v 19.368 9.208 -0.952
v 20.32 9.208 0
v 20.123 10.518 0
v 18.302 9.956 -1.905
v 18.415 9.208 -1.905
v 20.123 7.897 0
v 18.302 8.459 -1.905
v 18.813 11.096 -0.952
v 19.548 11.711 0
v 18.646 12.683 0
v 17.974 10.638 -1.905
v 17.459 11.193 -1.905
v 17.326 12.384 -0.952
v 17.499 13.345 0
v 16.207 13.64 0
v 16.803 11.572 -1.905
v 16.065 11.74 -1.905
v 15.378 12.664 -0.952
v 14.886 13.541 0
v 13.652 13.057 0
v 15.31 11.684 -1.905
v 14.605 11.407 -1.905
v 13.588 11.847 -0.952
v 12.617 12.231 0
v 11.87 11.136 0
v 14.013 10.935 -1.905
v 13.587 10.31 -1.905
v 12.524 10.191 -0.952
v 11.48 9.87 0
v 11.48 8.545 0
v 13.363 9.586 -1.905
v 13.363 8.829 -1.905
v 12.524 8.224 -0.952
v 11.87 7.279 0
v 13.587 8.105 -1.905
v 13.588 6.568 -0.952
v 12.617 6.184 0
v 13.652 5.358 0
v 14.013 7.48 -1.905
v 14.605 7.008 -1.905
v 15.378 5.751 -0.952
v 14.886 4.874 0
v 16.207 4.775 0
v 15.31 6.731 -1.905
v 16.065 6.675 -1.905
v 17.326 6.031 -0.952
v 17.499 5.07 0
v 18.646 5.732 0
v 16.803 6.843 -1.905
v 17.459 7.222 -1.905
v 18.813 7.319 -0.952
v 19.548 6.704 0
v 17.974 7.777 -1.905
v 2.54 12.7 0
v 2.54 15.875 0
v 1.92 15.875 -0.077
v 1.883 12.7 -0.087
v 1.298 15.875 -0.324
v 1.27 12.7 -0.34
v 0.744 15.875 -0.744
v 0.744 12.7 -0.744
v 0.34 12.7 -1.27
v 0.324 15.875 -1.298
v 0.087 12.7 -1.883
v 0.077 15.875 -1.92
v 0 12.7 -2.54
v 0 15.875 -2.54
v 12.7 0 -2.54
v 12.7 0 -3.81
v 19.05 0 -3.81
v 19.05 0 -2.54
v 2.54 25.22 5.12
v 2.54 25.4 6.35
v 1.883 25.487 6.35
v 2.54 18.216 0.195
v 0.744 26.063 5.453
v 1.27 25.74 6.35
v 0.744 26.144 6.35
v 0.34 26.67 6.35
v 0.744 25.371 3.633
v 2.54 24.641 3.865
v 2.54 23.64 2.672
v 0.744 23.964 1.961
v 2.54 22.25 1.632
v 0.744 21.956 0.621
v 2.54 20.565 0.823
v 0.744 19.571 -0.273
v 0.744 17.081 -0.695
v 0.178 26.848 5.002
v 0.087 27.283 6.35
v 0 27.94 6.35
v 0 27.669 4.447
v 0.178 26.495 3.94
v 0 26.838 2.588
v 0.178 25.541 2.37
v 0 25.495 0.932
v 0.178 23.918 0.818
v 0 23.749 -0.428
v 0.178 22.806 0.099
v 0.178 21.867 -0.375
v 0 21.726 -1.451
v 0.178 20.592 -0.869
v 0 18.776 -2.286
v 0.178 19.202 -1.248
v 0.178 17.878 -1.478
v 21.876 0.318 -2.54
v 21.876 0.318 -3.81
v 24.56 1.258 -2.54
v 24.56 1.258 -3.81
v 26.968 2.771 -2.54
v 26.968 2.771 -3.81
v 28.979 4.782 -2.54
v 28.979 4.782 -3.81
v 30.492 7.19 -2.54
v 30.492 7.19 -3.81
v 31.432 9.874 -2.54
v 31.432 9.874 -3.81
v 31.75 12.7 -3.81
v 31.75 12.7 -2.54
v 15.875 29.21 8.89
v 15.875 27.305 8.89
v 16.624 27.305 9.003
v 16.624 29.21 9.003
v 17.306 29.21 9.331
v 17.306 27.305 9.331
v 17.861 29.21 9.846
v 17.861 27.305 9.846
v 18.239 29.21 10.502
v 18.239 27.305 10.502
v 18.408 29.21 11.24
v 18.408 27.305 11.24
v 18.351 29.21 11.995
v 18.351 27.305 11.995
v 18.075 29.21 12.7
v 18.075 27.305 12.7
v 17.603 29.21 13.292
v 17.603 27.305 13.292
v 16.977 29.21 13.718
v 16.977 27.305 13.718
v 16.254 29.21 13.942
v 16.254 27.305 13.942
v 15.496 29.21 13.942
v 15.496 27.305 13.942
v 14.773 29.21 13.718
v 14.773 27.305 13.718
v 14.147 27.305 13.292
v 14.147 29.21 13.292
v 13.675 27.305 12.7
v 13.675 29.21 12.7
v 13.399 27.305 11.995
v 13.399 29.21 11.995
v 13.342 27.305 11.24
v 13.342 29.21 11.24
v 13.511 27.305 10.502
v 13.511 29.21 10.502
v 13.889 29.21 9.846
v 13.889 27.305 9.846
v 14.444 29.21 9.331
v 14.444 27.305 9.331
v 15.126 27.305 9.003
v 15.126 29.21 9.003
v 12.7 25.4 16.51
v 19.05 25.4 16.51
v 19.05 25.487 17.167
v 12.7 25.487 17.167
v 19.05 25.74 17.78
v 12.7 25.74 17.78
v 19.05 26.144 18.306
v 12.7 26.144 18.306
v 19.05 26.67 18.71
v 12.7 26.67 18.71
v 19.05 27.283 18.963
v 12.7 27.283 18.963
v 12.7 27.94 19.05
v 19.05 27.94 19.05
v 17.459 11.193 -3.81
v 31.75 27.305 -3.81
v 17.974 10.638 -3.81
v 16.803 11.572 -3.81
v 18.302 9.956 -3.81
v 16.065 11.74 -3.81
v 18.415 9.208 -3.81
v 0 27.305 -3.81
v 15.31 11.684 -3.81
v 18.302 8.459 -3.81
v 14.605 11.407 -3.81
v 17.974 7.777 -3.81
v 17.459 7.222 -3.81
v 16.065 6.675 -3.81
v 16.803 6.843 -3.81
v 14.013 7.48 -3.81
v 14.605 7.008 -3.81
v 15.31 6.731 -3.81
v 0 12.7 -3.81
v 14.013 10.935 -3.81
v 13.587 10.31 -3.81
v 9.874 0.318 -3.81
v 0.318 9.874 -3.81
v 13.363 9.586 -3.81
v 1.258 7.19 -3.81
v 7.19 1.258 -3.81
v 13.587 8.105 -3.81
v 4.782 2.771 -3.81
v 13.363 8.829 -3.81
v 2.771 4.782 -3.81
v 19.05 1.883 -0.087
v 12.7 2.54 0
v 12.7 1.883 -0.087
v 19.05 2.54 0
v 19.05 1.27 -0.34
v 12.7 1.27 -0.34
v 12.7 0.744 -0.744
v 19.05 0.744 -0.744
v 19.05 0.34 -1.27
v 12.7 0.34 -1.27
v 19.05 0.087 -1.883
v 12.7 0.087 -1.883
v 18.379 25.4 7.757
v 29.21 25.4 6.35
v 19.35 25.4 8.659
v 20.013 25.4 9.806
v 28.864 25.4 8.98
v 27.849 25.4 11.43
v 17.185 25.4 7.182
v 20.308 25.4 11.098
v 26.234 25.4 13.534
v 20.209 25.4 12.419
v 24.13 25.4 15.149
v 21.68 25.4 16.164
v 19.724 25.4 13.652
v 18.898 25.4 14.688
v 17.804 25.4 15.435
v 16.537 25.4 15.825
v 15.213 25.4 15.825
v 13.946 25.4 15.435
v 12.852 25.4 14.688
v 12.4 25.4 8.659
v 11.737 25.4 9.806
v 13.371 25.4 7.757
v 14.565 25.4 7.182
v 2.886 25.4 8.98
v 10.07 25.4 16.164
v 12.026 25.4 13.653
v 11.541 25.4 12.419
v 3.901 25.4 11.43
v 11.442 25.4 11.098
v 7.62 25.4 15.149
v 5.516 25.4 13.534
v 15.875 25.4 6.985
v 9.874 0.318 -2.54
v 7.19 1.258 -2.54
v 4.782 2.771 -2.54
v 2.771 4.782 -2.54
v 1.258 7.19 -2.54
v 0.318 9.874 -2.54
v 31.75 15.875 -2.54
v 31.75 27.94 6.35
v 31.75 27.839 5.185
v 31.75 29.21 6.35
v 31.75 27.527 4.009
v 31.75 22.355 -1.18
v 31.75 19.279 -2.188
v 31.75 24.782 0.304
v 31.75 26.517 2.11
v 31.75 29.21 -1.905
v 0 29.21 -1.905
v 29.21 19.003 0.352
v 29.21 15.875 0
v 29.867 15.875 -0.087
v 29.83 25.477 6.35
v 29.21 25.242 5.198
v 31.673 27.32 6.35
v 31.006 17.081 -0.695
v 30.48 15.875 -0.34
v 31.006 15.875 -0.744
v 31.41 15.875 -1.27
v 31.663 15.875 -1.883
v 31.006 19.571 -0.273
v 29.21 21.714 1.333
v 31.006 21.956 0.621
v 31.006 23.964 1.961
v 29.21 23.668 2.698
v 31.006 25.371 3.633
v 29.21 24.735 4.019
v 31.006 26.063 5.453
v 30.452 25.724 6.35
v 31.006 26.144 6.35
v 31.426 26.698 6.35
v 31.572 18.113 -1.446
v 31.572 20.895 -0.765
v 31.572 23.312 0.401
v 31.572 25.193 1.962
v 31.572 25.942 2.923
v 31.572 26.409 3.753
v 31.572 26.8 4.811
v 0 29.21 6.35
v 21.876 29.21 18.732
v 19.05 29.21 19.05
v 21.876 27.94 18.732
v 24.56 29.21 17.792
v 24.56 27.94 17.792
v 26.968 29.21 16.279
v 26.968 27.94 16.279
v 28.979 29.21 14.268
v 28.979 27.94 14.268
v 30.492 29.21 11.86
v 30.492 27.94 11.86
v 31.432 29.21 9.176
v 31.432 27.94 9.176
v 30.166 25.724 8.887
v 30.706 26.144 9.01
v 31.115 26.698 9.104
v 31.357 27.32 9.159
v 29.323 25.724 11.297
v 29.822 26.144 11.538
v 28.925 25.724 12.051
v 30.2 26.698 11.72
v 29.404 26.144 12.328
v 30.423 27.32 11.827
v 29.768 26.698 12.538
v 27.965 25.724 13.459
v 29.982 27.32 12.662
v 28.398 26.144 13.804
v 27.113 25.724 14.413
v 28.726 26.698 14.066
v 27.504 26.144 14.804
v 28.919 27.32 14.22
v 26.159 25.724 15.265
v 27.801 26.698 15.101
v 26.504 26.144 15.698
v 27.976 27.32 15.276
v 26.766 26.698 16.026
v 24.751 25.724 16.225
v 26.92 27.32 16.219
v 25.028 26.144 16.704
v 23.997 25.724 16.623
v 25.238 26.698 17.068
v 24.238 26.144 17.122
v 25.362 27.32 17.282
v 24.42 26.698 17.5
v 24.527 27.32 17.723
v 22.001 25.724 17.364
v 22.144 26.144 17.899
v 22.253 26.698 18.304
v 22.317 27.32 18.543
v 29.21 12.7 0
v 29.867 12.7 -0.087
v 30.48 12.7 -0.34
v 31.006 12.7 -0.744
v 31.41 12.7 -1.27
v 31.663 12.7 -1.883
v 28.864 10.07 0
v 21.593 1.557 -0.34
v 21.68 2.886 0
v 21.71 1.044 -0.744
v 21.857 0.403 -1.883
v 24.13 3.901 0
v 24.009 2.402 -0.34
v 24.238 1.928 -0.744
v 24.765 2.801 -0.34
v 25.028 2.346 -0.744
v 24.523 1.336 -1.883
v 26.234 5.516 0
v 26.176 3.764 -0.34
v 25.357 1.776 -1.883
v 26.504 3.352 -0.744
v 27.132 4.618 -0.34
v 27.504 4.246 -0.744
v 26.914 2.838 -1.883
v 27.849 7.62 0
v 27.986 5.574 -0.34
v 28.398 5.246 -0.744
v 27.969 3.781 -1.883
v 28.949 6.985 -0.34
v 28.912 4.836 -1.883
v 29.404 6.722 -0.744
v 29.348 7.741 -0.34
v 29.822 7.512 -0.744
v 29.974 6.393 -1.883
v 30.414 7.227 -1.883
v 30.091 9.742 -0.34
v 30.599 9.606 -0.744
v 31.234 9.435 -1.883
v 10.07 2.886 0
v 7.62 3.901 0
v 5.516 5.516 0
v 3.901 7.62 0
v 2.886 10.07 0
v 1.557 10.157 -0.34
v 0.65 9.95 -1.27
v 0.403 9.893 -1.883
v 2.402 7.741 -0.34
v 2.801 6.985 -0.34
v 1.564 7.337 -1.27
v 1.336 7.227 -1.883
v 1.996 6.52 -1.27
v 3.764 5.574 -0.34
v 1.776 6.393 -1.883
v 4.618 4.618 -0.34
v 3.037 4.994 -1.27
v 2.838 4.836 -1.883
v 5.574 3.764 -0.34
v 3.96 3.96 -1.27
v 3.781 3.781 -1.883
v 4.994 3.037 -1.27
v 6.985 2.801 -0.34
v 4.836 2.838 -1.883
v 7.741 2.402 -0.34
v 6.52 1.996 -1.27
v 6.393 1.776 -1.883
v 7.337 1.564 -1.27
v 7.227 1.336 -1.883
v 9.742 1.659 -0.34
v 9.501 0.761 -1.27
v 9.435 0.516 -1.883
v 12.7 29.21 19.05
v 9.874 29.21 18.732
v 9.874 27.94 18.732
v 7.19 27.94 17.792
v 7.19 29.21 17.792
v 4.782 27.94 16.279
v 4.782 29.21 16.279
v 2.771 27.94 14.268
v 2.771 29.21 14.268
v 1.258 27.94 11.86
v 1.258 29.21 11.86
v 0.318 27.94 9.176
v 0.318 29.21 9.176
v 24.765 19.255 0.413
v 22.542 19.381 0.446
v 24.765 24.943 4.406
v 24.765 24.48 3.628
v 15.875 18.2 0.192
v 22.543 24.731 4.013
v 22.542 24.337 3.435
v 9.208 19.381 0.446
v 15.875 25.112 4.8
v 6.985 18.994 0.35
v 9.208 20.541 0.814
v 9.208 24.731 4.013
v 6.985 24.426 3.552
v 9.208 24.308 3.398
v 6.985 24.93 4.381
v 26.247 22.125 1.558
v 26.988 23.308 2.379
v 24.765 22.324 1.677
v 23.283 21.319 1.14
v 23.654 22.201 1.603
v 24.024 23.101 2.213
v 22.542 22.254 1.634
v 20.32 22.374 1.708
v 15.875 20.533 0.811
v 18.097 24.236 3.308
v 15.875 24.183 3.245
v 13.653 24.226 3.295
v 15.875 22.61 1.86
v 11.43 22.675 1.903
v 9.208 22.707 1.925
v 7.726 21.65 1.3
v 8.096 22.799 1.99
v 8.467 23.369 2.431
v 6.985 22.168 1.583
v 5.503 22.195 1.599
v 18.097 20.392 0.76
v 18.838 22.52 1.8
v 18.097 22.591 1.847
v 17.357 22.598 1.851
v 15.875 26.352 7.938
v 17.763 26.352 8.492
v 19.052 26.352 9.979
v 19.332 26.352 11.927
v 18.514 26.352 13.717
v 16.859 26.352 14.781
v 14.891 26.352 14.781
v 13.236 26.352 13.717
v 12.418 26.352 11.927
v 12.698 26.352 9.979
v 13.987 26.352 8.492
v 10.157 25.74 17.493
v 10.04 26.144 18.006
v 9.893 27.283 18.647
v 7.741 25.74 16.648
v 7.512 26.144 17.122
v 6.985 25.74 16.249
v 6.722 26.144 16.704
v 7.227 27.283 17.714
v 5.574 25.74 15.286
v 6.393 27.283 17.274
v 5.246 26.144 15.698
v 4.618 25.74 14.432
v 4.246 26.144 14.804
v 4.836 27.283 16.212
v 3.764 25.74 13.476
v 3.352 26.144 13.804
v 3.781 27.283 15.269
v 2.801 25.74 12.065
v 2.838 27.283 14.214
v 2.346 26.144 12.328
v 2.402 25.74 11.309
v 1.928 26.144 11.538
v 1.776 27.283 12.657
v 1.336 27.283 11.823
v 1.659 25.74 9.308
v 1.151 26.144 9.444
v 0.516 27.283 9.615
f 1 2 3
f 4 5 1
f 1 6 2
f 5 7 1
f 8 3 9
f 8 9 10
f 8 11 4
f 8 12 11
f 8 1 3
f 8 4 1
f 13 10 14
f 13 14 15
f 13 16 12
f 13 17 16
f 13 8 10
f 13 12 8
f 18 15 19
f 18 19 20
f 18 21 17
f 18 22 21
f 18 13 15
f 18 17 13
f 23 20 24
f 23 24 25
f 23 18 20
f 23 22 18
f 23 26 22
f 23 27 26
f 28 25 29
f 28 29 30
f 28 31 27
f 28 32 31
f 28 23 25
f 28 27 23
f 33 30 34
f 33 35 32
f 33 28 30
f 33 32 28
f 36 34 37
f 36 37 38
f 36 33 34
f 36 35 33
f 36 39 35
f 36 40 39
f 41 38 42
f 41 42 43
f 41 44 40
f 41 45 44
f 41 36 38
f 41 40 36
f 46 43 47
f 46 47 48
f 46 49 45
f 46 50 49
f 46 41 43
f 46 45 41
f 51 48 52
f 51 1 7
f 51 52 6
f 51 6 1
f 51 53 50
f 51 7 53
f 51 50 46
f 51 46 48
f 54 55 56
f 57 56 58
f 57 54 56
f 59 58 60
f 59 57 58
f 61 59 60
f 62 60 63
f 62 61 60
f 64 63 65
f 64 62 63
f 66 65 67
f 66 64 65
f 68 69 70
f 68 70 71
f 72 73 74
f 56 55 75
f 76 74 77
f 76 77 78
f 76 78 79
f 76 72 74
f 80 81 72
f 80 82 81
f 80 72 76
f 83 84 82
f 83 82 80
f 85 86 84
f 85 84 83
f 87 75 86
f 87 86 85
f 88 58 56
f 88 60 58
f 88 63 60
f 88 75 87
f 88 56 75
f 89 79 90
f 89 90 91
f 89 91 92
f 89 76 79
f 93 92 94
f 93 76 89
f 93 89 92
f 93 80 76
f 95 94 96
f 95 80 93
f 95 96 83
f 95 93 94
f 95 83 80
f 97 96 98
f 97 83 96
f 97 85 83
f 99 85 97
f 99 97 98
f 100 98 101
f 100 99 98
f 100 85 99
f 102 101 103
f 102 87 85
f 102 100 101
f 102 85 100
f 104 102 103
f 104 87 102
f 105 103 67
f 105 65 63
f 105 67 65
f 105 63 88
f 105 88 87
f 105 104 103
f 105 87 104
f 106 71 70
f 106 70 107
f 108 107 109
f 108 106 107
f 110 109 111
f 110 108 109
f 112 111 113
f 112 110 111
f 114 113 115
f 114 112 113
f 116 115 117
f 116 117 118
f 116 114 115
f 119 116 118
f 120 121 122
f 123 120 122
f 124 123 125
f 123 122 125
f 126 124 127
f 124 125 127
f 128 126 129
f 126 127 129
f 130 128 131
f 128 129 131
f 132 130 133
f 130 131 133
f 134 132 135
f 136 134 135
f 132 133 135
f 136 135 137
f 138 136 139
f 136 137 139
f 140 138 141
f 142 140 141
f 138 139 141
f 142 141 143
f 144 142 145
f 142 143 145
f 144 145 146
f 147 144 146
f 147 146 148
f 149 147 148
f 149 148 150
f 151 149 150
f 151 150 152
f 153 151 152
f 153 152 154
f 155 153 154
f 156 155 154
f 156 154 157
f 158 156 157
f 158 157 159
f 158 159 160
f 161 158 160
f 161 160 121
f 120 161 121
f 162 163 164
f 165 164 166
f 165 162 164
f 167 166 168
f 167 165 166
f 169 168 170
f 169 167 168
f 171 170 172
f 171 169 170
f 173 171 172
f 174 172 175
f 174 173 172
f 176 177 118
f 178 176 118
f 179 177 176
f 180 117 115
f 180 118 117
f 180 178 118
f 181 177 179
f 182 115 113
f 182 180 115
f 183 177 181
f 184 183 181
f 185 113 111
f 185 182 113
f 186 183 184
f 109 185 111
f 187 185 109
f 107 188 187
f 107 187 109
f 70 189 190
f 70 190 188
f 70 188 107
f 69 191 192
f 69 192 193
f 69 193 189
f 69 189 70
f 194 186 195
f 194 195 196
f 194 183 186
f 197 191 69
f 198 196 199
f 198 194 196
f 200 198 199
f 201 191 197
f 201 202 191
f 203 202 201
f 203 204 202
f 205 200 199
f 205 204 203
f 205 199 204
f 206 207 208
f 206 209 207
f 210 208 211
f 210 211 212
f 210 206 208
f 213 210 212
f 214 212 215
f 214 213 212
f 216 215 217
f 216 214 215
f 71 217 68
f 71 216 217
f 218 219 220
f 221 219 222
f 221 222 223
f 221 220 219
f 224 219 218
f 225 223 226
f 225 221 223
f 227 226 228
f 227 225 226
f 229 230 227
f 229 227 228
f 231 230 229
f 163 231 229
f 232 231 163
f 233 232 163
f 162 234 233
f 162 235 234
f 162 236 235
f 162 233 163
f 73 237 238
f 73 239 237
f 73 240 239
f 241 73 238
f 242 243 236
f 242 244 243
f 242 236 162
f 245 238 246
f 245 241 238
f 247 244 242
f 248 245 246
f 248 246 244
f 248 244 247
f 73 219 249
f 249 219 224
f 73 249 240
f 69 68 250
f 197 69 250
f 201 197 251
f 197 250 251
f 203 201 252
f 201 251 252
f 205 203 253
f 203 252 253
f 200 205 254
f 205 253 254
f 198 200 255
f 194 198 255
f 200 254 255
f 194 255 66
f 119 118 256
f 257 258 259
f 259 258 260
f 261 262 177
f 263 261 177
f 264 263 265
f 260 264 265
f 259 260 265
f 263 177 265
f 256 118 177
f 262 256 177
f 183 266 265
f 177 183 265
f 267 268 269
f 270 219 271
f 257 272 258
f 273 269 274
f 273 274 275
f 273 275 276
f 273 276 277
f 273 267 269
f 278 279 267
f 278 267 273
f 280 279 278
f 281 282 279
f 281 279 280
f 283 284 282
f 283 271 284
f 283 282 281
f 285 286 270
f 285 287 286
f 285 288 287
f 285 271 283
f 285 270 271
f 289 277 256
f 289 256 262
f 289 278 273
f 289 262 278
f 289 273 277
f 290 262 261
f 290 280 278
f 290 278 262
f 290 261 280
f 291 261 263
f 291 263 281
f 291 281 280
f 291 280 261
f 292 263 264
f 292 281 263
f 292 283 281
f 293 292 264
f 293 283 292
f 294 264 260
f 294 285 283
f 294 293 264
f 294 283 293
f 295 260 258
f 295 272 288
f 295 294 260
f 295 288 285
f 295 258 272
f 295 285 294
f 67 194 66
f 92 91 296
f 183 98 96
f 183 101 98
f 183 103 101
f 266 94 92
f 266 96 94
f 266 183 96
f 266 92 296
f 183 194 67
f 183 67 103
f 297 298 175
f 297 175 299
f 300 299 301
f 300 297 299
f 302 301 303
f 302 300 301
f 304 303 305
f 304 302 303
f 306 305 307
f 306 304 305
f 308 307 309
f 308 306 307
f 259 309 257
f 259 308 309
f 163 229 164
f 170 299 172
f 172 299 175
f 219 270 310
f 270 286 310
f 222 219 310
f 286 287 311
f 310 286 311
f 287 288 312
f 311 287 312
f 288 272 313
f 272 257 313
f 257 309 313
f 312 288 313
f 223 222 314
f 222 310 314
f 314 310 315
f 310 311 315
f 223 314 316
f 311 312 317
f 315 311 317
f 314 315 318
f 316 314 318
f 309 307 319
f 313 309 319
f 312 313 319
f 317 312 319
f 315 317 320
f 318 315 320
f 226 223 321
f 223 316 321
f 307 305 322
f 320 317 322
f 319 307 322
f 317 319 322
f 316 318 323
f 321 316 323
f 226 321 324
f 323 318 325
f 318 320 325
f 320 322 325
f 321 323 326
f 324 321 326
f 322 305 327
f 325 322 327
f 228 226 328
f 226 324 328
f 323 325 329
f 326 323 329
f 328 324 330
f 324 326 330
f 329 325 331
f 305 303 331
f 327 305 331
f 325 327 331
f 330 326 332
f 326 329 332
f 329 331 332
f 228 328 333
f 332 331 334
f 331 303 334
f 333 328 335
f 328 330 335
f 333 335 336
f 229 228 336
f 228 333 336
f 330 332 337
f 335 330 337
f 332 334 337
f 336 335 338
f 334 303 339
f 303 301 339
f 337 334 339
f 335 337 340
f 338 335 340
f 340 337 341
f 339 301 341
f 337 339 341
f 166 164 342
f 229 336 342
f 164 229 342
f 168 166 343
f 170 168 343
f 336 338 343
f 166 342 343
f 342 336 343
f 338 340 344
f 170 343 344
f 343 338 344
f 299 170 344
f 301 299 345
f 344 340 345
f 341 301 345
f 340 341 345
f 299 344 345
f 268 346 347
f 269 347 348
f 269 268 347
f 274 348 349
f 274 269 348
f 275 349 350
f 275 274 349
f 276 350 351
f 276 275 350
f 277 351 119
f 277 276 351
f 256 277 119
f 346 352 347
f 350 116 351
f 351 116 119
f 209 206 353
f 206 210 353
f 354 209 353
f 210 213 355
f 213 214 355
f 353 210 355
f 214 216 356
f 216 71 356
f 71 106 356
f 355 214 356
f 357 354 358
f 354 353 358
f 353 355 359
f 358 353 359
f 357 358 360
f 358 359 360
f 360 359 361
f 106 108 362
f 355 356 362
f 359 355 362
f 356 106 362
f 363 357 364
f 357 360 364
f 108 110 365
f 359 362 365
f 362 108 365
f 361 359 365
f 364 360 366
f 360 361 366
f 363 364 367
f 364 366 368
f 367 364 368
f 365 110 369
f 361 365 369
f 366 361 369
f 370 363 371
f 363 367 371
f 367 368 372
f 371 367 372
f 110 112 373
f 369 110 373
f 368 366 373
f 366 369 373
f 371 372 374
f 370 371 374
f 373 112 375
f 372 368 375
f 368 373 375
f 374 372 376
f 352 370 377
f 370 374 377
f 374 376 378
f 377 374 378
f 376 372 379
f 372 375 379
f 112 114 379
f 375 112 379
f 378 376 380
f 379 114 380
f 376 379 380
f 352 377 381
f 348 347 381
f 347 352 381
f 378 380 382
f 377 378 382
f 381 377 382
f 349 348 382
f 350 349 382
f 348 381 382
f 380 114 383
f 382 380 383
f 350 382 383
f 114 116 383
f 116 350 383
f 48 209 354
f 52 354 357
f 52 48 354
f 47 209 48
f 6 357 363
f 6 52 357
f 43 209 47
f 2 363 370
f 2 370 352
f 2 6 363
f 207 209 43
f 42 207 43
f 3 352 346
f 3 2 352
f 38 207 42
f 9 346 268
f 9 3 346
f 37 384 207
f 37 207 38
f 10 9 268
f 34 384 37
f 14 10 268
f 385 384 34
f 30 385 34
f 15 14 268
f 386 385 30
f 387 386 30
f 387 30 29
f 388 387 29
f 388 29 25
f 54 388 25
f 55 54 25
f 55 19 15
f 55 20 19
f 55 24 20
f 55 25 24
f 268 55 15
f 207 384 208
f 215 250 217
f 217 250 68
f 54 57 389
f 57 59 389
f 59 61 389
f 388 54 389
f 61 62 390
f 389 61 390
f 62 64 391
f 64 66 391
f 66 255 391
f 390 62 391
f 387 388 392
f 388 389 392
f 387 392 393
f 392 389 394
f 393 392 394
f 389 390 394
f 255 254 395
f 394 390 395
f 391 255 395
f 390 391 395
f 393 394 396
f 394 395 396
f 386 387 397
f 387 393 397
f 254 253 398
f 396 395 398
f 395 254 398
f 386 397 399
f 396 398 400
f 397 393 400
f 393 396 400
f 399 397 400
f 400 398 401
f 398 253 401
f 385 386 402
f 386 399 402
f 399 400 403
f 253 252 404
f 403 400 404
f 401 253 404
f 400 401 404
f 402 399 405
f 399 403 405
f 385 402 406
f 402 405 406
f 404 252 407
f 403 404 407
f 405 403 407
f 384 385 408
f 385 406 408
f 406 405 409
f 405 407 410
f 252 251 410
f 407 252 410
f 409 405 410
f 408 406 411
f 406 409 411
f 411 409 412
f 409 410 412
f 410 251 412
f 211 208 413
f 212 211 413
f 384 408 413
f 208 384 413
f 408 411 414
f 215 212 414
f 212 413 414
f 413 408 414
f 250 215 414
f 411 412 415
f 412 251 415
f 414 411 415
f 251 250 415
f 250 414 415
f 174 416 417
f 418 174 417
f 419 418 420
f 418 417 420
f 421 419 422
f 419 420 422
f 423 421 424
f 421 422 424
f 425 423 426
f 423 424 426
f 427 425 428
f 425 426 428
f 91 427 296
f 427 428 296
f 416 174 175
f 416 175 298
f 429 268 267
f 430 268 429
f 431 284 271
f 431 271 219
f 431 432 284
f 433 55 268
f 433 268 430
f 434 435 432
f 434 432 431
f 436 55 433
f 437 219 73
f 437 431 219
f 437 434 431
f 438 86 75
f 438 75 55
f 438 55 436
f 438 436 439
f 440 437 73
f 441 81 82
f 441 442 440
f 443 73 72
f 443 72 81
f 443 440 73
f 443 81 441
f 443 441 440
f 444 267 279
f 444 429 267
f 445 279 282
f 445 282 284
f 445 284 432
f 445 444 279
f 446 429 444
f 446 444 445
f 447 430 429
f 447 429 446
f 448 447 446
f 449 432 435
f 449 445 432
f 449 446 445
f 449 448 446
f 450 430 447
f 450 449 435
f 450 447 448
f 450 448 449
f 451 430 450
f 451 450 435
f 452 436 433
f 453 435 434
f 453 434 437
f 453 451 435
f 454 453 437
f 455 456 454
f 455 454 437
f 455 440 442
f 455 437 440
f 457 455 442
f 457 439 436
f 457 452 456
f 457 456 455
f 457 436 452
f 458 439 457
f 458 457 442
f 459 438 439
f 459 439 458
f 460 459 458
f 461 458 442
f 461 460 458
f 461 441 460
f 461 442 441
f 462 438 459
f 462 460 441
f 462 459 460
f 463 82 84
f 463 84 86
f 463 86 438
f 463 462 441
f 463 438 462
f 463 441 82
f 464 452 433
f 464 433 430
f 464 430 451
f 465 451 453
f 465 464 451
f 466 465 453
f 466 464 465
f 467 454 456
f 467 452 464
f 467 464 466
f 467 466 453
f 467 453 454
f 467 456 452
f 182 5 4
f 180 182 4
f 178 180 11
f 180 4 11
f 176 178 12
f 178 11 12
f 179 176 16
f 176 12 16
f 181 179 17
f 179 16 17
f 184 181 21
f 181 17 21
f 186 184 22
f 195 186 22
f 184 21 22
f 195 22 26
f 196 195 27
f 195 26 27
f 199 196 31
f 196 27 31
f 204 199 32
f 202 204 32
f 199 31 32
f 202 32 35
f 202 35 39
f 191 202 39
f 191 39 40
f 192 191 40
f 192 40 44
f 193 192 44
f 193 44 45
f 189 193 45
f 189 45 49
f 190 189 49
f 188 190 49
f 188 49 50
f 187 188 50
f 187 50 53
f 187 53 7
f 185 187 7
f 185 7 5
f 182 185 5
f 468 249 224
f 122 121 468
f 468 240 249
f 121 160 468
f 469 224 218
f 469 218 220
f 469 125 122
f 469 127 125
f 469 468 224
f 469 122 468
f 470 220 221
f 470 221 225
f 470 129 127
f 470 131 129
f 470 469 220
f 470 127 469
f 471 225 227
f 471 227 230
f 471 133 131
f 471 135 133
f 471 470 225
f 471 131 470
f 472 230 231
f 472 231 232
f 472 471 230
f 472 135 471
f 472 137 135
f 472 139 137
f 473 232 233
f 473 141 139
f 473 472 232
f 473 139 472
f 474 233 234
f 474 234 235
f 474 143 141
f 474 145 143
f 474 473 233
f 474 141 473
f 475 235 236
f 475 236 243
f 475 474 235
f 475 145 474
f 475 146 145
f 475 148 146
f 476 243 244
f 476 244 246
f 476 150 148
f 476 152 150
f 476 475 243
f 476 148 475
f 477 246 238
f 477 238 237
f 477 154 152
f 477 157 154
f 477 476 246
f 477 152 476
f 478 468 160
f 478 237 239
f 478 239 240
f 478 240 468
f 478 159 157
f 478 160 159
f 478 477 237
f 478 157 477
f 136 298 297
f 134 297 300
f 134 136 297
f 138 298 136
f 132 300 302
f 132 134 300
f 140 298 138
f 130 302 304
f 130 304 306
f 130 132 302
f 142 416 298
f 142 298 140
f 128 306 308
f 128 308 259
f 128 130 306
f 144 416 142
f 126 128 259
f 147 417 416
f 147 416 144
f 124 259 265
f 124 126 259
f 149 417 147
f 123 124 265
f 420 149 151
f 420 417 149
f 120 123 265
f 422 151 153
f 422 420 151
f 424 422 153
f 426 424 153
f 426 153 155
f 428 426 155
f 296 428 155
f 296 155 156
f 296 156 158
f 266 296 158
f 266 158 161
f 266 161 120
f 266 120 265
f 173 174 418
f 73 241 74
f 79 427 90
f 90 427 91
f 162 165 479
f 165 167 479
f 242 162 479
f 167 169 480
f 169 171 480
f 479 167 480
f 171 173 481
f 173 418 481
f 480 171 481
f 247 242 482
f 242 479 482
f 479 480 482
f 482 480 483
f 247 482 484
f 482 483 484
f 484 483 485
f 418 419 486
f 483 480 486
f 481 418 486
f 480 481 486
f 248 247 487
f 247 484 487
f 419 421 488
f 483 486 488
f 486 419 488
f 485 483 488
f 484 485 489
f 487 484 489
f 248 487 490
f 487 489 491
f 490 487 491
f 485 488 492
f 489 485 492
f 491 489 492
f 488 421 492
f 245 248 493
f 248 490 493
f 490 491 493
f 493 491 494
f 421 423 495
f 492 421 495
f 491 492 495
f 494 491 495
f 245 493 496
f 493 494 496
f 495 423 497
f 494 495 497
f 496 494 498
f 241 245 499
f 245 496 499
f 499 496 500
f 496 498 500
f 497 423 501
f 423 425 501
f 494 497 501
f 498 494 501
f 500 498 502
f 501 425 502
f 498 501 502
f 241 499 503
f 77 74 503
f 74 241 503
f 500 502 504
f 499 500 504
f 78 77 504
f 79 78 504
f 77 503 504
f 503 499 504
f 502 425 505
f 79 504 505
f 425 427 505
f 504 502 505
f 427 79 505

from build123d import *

# Parameters (mm, degrees)
BOSS_EXTRUDE1_DEPTH = 31.75
FILLET3_R           = 12.7
FILLET1_SIZE        = 9.525
FILLET1_SIZE_2      = 6.35
FILLET2_R           = 2.54
SKETCH3_R           = 2.54
CUT_EXTRUDE1_DEPTH  = 48.161309524
SKETCH4_R           = 2.54
CUT_EXTRUDE2_DEPTH  = 45.901280775
CHAMFER1_SIZE       = 1.905


with BuildPart() as part:
    # Sketch1 → Boss-Extrude1 (new body)
    with BuildSketch(Plane(origin=(0, 0, 0), x_dir=(0, 0, -1), z_dir=(1, 0, 0))):
        Polygon((0, 0), (0, 25.4), (-19.05, 25.4), (-19.05, 29.21), (3.81, 29.21), (3.81, 0), align=None)
    extrude(amount=BOSS_EXTRUDE1_DEPTH)

    # Fillet3
    fillet3_edges = [part.edges().sort_by_distance(p)[0] for p in [
        (31.75, 27.305, 19.05),
        (31.75, 0, -1.905),
        (0, 27.305, 19.05),
        (0, 0, -1.905),
    ]]
    fillet(fillet3_edges, radius=FILLET3_R)

    # Fillet1
    # an asymmetric fillet: 9.525, 6.35 mm, written as the material it adds along each edge
    with BuildSketch(Plane(origin=(0, 25.4, 0), x_dir=(0, -1, 0), z_dir=(1, 0, 0))) as fillet1_piece_1:
        with BuildLine():
            Bezier((FILLET1_SIZE, 0), (0, 0), (0, -FILLET1_SIZE_2), weights=[1, 0.707106781, 1])
            Line((0, -FILLET1_SIZE_2), (0, 0))
            Line((0, 0), (FILLET1_SIZE, 0))
        make_face()
    extrude(amount=31.75)

    # Fillet2
    fillet2_edges = [part.edges().sort_by_distance(p)[0] for p in [
        (15.875, 0, 0),
        (15.875, 25.4, 19.05),
        (28.030256121, 25.4, 15.330256121),
        (31.75, 21.935812925, 1.451375627),
        (31.75, 14.2875, 0),
        (28.030256121, 3.719743879, 0),
        (3.719743879, 3.719743879, 0),
        (0, 14.2875, 0),
        (0, 21.935812925, 1.451375627),
        (3.719743879, 25.4, 15.330256121),
    ]]
    fillet(fillet2_edges, radius=FILLET2_R)

    # Sketch3 → Cut-Extrude1 (cut, through all)
    with BuildSketch(Plane.XY):
        with Locations((15.875, 9.2075)):
            Circle(SKETCH3_R)
    extrude(amount=-CUT_EXTRUDE1_DEPTH, mode=Mode.SUBTRACT)

    # Sketch4 → Cut-Extrude2 (cut, through all)
    with BuildSketch(Plane.XZ.offset(-25.4)):
        with Locations(Location((15.875, 11.43, 0), (0, 0, 270))):
            Circle(SKETCH4_R)
    extrude(amount=-CUT_EXTRUDE2_DEPTH, mode=Mode.SUBTRACT)

    # Chamfer1
    chamfer1_edges = [part.edges().sort_by_distance(p)[0] for p in [
        (15.875, 29.21, -3.81),
        (13.335, 9.2075, 0),
        (15.875, 25.4, 13.97),
    ]]
    chamfer(chamfer1_edges, length=CHAMFER1_SIZE)


solid = part.part
